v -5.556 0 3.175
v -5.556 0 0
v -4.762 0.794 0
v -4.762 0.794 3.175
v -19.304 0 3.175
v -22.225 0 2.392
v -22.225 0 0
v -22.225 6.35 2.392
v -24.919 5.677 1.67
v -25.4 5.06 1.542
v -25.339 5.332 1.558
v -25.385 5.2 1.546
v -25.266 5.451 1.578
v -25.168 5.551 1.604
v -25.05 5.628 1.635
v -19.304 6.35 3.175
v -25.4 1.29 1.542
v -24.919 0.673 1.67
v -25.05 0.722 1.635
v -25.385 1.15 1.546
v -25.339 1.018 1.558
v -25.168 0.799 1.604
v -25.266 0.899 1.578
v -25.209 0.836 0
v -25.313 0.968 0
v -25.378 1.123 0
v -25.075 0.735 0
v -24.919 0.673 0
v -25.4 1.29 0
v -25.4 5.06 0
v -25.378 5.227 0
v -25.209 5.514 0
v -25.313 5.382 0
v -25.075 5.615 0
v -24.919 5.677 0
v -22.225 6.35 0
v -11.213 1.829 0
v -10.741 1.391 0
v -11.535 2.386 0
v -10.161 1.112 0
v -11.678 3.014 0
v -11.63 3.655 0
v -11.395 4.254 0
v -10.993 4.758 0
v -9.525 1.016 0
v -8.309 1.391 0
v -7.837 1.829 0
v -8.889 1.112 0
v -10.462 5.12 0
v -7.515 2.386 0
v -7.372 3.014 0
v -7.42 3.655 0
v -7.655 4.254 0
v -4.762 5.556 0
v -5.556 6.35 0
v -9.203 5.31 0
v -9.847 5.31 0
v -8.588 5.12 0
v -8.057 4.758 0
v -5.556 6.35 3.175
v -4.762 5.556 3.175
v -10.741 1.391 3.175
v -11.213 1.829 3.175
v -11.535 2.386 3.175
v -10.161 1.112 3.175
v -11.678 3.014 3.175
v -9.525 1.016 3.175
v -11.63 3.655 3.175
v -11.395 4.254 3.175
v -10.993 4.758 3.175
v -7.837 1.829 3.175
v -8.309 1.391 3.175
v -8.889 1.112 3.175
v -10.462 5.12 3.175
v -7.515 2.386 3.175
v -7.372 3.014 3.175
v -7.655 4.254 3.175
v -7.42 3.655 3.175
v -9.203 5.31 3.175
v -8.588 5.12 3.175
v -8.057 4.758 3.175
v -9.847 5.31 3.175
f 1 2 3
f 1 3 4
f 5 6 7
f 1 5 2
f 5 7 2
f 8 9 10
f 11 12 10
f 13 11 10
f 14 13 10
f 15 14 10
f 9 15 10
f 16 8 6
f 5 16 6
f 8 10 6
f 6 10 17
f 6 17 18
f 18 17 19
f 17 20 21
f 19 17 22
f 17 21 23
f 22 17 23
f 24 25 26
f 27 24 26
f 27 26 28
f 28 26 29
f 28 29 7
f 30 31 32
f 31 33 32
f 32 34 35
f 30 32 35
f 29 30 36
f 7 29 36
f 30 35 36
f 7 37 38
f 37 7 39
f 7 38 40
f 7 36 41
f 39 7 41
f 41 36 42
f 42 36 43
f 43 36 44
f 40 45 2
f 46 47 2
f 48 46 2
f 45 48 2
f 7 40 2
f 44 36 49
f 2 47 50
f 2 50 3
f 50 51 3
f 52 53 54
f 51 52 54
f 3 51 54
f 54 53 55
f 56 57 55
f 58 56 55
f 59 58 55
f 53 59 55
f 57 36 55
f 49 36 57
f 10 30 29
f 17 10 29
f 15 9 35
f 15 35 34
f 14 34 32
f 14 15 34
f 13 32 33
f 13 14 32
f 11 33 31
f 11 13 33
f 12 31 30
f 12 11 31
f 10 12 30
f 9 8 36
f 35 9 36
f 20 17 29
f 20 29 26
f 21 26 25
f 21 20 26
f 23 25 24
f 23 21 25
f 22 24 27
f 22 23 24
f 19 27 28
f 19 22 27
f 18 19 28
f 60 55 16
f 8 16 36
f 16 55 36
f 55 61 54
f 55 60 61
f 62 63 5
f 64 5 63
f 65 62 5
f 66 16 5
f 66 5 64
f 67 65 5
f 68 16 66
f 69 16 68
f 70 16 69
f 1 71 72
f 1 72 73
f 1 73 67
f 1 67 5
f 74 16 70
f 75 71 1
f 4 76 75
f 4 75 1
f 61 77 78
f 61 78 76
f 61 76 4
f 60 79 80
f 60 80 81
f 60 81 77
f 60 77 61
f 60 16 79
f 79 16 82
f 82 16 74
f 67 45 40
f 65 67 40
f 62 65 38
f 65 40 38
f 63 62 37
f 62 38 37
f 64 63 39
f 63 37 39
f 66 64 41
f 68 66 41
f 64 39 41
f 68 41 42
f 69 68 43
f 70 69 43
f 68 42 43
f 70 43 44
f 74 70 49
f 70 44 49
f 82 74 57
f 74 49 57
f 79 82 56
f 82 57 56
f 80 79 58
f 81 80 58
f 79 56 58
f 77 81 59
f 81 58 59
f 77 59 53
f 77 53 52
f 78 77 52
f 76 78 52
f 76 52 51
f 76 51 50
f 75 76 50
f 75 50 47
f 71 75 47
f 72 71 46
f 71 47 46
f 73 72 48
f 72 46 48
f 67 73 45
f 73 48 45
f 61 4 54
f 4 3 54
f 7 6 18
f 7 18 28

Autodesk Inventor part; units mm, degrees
ref_plane "YZ Plane" through (0, 0, 0) normal (1, 0, 0) x (0, 1, 0)
ref_plane "XZ Plane" through (0, 0, 0) normal (0, 1, 0) x (-1, 0, 0)
ref_plane "XY Plane" through (0, 0, 0) normal (0, 0, 1) x (1, 0, 0)
sketch "Sketch1" plane through (0, 0, 0) normal (0, 0, 1) x (1, 0, 0)
  line L0 (-25.4, 6.35) -> (-25.4, 0)
  line L1 (-25.4, 0) -> (-4.7625, 0)
  line L2 (-4.7625, 0) -> (-4.7625, 6.35)
  line L3 (-4.7625, 6.35) -> (-25.4, 6.35)
  dimension "d0" = 6.35
  dimension "d1" = 20.6375
extrude "Extrusion1" add sketch "Sketch1" along normal blind 3.175
hole "Hole1" at (-9.525, 3.175, 3.175) direction (0, 0, -1) diameter 4.318 end through all clearance for "Flat Head Machine Screw (82)" size "#8" standard "Ansi Unified Screw Threads"
chamfer "Chamfer3" distance 0.7937 angle 45 1 edges at (-4.7625, 0, 1.5875)
chamfer "Chamfer4" distance 0.7937 angle 45 1 edges at (-4.7625, 6.35, 1.5875)
chamfer "Chamfer5" distance 0.7937 distance2 3.175 1 edges at (-25.4, 0, 1.5875) measured on face at (-25.4, 4.2333, 1.0583)
chamfer "Chamfer6" distance 3.175 distance2 0.7937 1 edges at (-25.4, 6.35, 1.5875) measured on face at (-12.1708, 6.35, 1.0583)
chamfer "Chamfer7" distance 6.096 angle 15 1 edges at (-25.4, 3.175, 3.175) measured on face at (-18.7061, 3.2617, 3.175)
fillet "Fillet1" radius 0.635 2 edges at (-25.4, 0.7937, 0.7708) (-25.4, 5.5562, 0.7708)
properties part number "J005776" material "STAINLESS STEEL, 303"
